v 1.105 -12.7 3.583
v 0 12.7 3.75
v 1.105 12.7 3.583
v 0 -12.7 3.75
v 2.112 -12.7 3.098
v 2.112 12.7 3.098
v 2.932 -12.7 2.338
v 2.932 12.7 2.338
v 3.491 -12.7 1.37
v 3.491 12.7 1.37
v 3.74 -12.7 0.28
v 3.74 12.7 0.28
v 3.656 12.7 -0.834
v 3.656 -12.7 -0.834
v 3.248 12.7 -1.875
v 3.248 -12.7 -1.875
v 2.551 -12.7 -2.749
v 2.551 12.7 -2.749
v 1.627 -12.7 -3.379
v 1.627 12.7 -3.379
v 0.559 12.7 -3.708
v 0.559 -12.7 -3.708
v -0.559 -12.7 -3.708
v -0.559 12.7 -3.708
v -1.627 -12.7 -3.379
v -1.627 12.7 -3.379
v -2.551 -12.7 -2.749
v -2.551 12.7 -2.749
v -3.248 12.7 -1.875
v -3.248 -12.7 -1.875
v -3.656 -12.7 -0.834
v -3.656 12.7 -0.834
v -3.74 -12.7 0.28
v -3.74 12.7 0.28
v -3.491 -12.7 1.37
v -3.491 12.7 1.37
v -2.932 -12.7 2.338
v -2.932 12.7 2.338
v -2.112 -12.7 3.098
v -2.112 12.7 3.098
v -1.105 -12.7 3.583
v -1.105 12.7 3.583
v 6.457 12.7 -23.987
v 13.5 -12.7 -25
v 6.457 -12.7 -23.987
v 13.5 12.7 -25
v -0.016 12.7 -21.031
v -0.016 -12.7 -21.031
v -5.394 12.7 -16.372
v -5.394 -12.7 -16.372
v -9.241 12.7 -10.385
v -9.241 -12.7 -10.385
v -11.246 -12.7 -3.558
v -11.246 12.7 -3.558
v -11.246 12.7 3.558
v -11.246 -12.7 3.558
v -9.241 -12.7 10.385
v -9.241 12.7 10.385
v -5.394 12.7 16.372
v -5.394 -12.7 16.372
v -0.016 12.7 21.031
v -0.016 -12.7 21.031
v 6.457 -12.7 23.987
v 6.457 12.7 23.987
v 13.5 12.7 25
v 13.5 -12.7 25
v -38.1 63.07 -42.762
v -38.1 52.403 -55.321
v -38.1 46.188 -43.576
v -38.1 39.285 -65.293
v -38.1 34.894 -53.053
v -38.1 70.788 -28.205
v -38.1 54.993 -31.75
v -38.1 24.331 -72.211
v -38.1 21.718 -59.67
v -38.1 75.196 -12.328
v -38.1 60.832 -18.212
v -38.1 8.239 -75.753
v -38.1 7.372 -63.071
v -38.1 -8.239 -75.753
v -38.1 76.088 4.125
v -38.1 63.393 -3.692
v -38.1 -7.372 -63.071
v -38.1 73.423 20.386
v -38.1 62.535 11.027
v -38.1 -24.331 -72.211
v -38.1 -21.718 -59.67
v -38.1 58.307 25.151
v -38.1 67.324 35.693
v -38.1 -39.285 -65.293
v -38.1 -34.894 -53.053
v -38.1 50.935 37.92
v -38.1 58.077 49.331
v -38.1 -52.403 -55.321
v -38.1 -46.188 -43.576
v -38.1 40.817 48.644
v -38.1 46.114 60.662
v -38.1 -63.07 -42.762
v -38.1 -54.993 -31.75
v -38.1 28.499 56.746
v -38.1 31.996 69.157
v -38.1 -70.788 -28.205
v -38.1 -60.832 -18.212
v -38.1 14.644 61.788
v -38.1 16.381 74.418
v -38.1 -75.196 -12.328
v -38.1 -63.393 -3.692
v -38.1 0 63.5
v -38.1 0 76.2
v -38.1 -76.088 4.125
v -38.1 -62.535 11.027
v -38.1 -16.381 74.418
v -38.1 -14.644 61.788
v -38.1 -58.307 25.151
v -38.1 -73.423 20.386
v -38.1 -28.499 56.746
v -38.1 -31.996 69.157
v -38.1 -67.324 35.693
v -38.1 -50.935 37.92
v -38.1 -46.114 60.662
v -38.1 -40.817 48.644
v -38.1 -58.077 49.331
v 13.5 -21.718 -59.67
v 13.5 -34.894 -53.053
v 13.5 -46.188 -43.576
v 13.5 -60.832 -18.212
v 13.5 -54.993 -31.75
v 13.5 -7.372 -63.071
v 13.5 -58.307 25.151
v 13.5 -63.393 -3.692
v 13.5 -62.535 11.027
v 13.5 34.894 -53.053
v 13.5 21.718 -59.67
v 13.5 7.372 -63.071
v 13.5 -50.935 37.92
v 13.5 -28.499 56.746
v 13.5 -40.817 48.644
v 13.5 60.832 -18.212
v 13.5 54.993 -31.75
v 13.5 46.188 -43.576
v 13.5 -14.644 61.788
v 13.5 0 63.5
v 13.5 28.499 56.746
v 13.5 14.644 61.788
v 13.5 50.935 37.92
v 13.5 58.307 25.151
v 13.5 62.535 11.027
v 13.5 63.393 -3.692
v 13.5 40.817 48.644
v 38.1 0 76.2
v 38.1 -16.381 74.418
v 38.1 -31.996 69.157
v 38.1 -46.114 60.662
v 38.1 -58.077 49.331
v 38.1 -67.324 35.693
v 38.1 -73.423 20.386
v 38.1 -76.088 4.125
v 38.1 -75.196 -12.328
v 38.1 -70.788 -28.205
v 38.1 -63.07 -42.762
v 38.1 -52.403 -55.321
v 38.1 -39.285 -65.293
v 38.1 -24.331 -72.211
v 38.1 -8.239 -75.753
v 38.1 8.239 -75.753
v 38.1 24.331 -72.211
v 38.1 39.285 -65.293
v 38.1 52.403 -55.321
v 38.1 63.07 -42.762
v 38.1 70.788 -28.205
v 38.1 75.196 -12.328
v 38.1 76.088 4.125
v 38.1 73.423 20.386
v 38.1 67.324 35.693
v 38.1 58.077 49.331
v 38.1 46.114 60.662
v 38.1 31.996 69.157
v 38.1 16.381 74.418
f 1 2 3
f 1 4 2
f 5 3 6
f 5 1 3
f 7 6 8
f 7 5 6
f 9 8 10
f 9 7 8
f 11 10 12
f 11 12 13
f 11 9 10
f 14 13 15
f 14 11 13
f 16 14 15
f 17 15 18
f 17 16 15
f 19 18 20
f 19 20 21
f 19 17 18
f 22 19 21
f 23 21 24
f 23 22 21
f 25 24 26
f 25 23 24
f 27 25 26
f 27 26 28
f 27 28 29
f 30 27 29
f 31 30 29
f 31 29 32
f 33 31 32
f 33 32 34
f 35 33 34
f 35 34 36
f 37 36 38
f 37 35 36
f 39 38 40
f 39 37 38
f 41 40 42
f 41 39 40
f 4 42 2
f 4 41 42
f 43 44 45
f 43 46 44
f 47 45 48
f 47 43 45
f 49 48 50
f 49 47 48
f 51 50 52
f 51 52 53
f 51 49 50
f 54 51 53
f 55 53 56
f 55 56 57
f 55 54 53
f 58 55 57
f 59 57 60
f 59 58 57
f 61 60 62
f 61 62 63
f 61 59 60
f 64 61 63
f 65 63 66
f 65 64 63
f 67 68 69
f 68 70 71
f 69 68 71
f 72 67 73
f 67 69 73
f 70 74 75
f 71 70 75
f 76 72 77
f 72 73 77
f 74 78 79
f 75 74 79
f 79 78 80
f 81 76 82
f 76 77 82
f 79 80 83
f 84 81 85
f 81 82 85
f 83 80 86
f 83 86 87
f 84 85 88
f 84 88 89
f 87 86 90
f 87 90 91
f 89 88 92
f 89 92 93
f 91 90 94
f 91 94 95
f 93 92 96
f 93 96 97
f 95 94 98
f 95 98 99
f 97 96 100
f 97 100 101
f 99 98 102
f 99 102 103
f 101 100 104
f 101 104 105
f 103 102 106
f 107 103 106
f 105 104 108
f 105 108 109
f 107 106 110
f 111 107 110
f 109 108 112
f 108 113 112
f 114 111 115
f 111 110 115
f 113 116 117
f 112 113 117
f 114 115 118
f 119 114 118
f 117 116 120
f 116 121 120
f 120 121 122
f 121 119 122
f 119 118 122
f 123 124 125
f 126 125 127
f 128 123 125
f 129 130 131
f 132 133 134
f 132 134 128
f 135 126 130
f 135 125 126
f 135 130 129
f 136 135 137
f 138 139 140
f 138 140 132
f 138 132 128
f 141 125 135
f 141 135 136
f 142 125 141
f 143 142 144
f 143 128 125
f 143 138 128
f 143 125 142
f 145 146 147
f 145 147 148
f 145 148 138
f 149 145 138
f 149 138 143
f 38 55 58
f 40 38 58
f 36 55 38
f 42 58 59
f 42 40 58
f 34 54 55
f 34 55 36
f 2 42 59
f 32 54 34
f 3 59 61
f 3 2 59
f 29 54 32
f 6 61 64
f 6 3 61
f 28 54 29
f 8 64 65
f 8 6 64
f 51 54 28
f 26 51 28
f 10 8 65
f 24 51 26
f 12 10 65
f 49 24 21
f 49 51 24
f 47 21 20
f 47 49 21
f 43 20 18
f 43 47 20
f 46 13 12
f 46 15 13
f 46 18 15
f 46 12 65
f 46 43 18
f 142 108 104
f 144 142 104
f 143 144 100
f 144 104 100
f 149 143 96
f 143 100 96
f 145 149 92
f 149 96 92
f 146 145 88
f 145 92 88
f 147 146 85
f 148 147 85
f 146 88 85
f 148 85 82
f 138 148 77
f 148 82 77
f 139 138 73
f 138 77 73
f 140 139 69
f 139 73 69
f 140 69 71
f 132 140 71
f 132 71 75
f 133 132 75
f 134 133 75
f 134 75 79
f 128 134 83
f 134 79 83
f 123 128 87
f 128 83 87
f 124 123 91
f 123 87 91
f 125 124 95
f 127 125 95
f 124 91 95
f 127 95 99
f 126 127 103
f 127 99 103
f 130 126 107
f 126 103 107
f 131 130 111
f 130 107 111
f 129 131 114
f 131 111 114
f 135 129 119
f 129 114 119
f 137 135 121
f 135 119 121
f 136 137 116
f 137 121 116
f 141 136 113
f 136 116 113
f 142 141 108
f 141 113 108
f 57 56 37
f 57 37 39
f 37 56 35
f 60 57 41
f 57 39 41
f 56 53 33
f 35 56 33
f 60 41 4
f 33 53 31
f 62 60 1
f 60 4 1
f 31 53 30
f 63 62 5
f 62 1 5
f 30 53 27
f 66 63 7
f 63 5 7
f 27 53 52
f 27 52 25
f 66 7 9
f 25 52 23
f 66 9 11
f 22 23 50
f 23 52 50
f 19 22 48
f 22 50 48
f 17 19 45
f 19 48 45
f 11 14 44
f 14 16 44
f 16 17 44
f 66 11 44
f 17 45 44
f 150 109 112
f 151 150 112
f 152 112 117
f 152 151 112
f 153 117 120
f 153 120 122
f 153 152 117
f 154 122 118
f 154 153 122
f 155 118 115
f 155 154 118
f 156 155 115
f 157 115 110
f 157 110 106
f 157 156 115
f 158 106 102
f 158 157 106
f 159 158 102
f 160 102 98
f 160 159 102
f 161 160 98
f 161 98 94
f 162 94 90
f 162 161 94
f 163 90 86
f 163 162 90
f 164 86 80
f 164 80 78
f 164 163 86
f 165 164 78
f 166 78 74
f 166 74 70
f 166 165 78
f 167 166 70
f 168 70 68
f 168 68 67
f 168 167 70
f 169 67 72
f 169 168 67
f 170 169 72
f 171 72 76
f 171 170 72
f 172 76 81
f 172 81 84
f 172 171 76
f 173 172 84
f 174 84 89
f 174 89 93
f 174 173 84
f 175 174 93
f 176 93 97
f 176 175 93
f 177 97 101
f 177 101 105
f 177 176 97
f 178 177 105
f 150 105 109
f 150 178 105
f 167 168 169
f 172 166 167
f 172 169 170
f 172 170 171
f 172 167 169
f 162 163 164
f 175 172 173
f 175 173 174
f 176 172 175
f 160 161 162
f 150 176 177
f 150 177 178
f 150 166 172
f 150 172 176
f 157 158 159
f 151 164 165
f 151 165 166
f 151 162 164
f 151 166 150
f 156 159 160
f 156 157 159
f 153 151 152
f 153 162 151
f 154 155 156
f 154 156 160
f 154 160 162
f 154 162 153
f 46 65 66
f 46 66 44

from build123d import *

# Parameters (mm, degrees)
SKETCH2_R           = 76.2
BOSS_EXTRUDE1_DEPTH = 38.1
SKETCH5_R           = 63.5
CUT_EXTRUDE2_DEPTH  = 51.6
SKETCH6_R           = 3.75
BOSS_EXTRUDE4_DEPTH = 12.7


with BuildPart() as part:
    # Sketch2 → Boss-Extrude1 (new, symmetric)
    with BuildSketch(Plane(origin=(0, 0, 0), x_dir=(0, 0, -1), z_dir=(1, 0, 0))):
        with Locations(Location((0, 0, 0), (0, 0, 180))):
            Circle(SKETCH2_R)
    extrude(amount=BOSS_EXTRUDE1_DEPTH, both=True)

    # Sketch5 → Cut-Extrude2 (cut)
    with BuildSketch(Plane.ZY.offset(38.1)):
        Circle(SKETCH5_R)
    extrude(amount=-CUT_EXTRUDE2_DEPTH, mode=Mode.SUBTRACT)


with BuildPart() as body_2:
    # Sketch6 → Boss-Extrude4 (new, symmetric)
    with BuildSketch(Plane(origin=(0, 0, 0), x_dir=(1, 0, 0), z_dir=(0, 1, 0))):
        with BuildLine():
            Line((13.5, 0), (13.5, 25))
            ThreePointArc((13.5, 25), (-11.5, 0), (13.5, -25))
            Line((13.5, -25), (13.5, 0))
        make_face()
        with Locations(Location((0, 0, 0), (0, 0, 270))):
            Circle(SKETCH6_R, mode=Mode.SUBTRACT)
    extrude(amount=BOSS_EXTRUDE4_DEPTH, both=True)


solid = Compound([part.part, body_2.part])
